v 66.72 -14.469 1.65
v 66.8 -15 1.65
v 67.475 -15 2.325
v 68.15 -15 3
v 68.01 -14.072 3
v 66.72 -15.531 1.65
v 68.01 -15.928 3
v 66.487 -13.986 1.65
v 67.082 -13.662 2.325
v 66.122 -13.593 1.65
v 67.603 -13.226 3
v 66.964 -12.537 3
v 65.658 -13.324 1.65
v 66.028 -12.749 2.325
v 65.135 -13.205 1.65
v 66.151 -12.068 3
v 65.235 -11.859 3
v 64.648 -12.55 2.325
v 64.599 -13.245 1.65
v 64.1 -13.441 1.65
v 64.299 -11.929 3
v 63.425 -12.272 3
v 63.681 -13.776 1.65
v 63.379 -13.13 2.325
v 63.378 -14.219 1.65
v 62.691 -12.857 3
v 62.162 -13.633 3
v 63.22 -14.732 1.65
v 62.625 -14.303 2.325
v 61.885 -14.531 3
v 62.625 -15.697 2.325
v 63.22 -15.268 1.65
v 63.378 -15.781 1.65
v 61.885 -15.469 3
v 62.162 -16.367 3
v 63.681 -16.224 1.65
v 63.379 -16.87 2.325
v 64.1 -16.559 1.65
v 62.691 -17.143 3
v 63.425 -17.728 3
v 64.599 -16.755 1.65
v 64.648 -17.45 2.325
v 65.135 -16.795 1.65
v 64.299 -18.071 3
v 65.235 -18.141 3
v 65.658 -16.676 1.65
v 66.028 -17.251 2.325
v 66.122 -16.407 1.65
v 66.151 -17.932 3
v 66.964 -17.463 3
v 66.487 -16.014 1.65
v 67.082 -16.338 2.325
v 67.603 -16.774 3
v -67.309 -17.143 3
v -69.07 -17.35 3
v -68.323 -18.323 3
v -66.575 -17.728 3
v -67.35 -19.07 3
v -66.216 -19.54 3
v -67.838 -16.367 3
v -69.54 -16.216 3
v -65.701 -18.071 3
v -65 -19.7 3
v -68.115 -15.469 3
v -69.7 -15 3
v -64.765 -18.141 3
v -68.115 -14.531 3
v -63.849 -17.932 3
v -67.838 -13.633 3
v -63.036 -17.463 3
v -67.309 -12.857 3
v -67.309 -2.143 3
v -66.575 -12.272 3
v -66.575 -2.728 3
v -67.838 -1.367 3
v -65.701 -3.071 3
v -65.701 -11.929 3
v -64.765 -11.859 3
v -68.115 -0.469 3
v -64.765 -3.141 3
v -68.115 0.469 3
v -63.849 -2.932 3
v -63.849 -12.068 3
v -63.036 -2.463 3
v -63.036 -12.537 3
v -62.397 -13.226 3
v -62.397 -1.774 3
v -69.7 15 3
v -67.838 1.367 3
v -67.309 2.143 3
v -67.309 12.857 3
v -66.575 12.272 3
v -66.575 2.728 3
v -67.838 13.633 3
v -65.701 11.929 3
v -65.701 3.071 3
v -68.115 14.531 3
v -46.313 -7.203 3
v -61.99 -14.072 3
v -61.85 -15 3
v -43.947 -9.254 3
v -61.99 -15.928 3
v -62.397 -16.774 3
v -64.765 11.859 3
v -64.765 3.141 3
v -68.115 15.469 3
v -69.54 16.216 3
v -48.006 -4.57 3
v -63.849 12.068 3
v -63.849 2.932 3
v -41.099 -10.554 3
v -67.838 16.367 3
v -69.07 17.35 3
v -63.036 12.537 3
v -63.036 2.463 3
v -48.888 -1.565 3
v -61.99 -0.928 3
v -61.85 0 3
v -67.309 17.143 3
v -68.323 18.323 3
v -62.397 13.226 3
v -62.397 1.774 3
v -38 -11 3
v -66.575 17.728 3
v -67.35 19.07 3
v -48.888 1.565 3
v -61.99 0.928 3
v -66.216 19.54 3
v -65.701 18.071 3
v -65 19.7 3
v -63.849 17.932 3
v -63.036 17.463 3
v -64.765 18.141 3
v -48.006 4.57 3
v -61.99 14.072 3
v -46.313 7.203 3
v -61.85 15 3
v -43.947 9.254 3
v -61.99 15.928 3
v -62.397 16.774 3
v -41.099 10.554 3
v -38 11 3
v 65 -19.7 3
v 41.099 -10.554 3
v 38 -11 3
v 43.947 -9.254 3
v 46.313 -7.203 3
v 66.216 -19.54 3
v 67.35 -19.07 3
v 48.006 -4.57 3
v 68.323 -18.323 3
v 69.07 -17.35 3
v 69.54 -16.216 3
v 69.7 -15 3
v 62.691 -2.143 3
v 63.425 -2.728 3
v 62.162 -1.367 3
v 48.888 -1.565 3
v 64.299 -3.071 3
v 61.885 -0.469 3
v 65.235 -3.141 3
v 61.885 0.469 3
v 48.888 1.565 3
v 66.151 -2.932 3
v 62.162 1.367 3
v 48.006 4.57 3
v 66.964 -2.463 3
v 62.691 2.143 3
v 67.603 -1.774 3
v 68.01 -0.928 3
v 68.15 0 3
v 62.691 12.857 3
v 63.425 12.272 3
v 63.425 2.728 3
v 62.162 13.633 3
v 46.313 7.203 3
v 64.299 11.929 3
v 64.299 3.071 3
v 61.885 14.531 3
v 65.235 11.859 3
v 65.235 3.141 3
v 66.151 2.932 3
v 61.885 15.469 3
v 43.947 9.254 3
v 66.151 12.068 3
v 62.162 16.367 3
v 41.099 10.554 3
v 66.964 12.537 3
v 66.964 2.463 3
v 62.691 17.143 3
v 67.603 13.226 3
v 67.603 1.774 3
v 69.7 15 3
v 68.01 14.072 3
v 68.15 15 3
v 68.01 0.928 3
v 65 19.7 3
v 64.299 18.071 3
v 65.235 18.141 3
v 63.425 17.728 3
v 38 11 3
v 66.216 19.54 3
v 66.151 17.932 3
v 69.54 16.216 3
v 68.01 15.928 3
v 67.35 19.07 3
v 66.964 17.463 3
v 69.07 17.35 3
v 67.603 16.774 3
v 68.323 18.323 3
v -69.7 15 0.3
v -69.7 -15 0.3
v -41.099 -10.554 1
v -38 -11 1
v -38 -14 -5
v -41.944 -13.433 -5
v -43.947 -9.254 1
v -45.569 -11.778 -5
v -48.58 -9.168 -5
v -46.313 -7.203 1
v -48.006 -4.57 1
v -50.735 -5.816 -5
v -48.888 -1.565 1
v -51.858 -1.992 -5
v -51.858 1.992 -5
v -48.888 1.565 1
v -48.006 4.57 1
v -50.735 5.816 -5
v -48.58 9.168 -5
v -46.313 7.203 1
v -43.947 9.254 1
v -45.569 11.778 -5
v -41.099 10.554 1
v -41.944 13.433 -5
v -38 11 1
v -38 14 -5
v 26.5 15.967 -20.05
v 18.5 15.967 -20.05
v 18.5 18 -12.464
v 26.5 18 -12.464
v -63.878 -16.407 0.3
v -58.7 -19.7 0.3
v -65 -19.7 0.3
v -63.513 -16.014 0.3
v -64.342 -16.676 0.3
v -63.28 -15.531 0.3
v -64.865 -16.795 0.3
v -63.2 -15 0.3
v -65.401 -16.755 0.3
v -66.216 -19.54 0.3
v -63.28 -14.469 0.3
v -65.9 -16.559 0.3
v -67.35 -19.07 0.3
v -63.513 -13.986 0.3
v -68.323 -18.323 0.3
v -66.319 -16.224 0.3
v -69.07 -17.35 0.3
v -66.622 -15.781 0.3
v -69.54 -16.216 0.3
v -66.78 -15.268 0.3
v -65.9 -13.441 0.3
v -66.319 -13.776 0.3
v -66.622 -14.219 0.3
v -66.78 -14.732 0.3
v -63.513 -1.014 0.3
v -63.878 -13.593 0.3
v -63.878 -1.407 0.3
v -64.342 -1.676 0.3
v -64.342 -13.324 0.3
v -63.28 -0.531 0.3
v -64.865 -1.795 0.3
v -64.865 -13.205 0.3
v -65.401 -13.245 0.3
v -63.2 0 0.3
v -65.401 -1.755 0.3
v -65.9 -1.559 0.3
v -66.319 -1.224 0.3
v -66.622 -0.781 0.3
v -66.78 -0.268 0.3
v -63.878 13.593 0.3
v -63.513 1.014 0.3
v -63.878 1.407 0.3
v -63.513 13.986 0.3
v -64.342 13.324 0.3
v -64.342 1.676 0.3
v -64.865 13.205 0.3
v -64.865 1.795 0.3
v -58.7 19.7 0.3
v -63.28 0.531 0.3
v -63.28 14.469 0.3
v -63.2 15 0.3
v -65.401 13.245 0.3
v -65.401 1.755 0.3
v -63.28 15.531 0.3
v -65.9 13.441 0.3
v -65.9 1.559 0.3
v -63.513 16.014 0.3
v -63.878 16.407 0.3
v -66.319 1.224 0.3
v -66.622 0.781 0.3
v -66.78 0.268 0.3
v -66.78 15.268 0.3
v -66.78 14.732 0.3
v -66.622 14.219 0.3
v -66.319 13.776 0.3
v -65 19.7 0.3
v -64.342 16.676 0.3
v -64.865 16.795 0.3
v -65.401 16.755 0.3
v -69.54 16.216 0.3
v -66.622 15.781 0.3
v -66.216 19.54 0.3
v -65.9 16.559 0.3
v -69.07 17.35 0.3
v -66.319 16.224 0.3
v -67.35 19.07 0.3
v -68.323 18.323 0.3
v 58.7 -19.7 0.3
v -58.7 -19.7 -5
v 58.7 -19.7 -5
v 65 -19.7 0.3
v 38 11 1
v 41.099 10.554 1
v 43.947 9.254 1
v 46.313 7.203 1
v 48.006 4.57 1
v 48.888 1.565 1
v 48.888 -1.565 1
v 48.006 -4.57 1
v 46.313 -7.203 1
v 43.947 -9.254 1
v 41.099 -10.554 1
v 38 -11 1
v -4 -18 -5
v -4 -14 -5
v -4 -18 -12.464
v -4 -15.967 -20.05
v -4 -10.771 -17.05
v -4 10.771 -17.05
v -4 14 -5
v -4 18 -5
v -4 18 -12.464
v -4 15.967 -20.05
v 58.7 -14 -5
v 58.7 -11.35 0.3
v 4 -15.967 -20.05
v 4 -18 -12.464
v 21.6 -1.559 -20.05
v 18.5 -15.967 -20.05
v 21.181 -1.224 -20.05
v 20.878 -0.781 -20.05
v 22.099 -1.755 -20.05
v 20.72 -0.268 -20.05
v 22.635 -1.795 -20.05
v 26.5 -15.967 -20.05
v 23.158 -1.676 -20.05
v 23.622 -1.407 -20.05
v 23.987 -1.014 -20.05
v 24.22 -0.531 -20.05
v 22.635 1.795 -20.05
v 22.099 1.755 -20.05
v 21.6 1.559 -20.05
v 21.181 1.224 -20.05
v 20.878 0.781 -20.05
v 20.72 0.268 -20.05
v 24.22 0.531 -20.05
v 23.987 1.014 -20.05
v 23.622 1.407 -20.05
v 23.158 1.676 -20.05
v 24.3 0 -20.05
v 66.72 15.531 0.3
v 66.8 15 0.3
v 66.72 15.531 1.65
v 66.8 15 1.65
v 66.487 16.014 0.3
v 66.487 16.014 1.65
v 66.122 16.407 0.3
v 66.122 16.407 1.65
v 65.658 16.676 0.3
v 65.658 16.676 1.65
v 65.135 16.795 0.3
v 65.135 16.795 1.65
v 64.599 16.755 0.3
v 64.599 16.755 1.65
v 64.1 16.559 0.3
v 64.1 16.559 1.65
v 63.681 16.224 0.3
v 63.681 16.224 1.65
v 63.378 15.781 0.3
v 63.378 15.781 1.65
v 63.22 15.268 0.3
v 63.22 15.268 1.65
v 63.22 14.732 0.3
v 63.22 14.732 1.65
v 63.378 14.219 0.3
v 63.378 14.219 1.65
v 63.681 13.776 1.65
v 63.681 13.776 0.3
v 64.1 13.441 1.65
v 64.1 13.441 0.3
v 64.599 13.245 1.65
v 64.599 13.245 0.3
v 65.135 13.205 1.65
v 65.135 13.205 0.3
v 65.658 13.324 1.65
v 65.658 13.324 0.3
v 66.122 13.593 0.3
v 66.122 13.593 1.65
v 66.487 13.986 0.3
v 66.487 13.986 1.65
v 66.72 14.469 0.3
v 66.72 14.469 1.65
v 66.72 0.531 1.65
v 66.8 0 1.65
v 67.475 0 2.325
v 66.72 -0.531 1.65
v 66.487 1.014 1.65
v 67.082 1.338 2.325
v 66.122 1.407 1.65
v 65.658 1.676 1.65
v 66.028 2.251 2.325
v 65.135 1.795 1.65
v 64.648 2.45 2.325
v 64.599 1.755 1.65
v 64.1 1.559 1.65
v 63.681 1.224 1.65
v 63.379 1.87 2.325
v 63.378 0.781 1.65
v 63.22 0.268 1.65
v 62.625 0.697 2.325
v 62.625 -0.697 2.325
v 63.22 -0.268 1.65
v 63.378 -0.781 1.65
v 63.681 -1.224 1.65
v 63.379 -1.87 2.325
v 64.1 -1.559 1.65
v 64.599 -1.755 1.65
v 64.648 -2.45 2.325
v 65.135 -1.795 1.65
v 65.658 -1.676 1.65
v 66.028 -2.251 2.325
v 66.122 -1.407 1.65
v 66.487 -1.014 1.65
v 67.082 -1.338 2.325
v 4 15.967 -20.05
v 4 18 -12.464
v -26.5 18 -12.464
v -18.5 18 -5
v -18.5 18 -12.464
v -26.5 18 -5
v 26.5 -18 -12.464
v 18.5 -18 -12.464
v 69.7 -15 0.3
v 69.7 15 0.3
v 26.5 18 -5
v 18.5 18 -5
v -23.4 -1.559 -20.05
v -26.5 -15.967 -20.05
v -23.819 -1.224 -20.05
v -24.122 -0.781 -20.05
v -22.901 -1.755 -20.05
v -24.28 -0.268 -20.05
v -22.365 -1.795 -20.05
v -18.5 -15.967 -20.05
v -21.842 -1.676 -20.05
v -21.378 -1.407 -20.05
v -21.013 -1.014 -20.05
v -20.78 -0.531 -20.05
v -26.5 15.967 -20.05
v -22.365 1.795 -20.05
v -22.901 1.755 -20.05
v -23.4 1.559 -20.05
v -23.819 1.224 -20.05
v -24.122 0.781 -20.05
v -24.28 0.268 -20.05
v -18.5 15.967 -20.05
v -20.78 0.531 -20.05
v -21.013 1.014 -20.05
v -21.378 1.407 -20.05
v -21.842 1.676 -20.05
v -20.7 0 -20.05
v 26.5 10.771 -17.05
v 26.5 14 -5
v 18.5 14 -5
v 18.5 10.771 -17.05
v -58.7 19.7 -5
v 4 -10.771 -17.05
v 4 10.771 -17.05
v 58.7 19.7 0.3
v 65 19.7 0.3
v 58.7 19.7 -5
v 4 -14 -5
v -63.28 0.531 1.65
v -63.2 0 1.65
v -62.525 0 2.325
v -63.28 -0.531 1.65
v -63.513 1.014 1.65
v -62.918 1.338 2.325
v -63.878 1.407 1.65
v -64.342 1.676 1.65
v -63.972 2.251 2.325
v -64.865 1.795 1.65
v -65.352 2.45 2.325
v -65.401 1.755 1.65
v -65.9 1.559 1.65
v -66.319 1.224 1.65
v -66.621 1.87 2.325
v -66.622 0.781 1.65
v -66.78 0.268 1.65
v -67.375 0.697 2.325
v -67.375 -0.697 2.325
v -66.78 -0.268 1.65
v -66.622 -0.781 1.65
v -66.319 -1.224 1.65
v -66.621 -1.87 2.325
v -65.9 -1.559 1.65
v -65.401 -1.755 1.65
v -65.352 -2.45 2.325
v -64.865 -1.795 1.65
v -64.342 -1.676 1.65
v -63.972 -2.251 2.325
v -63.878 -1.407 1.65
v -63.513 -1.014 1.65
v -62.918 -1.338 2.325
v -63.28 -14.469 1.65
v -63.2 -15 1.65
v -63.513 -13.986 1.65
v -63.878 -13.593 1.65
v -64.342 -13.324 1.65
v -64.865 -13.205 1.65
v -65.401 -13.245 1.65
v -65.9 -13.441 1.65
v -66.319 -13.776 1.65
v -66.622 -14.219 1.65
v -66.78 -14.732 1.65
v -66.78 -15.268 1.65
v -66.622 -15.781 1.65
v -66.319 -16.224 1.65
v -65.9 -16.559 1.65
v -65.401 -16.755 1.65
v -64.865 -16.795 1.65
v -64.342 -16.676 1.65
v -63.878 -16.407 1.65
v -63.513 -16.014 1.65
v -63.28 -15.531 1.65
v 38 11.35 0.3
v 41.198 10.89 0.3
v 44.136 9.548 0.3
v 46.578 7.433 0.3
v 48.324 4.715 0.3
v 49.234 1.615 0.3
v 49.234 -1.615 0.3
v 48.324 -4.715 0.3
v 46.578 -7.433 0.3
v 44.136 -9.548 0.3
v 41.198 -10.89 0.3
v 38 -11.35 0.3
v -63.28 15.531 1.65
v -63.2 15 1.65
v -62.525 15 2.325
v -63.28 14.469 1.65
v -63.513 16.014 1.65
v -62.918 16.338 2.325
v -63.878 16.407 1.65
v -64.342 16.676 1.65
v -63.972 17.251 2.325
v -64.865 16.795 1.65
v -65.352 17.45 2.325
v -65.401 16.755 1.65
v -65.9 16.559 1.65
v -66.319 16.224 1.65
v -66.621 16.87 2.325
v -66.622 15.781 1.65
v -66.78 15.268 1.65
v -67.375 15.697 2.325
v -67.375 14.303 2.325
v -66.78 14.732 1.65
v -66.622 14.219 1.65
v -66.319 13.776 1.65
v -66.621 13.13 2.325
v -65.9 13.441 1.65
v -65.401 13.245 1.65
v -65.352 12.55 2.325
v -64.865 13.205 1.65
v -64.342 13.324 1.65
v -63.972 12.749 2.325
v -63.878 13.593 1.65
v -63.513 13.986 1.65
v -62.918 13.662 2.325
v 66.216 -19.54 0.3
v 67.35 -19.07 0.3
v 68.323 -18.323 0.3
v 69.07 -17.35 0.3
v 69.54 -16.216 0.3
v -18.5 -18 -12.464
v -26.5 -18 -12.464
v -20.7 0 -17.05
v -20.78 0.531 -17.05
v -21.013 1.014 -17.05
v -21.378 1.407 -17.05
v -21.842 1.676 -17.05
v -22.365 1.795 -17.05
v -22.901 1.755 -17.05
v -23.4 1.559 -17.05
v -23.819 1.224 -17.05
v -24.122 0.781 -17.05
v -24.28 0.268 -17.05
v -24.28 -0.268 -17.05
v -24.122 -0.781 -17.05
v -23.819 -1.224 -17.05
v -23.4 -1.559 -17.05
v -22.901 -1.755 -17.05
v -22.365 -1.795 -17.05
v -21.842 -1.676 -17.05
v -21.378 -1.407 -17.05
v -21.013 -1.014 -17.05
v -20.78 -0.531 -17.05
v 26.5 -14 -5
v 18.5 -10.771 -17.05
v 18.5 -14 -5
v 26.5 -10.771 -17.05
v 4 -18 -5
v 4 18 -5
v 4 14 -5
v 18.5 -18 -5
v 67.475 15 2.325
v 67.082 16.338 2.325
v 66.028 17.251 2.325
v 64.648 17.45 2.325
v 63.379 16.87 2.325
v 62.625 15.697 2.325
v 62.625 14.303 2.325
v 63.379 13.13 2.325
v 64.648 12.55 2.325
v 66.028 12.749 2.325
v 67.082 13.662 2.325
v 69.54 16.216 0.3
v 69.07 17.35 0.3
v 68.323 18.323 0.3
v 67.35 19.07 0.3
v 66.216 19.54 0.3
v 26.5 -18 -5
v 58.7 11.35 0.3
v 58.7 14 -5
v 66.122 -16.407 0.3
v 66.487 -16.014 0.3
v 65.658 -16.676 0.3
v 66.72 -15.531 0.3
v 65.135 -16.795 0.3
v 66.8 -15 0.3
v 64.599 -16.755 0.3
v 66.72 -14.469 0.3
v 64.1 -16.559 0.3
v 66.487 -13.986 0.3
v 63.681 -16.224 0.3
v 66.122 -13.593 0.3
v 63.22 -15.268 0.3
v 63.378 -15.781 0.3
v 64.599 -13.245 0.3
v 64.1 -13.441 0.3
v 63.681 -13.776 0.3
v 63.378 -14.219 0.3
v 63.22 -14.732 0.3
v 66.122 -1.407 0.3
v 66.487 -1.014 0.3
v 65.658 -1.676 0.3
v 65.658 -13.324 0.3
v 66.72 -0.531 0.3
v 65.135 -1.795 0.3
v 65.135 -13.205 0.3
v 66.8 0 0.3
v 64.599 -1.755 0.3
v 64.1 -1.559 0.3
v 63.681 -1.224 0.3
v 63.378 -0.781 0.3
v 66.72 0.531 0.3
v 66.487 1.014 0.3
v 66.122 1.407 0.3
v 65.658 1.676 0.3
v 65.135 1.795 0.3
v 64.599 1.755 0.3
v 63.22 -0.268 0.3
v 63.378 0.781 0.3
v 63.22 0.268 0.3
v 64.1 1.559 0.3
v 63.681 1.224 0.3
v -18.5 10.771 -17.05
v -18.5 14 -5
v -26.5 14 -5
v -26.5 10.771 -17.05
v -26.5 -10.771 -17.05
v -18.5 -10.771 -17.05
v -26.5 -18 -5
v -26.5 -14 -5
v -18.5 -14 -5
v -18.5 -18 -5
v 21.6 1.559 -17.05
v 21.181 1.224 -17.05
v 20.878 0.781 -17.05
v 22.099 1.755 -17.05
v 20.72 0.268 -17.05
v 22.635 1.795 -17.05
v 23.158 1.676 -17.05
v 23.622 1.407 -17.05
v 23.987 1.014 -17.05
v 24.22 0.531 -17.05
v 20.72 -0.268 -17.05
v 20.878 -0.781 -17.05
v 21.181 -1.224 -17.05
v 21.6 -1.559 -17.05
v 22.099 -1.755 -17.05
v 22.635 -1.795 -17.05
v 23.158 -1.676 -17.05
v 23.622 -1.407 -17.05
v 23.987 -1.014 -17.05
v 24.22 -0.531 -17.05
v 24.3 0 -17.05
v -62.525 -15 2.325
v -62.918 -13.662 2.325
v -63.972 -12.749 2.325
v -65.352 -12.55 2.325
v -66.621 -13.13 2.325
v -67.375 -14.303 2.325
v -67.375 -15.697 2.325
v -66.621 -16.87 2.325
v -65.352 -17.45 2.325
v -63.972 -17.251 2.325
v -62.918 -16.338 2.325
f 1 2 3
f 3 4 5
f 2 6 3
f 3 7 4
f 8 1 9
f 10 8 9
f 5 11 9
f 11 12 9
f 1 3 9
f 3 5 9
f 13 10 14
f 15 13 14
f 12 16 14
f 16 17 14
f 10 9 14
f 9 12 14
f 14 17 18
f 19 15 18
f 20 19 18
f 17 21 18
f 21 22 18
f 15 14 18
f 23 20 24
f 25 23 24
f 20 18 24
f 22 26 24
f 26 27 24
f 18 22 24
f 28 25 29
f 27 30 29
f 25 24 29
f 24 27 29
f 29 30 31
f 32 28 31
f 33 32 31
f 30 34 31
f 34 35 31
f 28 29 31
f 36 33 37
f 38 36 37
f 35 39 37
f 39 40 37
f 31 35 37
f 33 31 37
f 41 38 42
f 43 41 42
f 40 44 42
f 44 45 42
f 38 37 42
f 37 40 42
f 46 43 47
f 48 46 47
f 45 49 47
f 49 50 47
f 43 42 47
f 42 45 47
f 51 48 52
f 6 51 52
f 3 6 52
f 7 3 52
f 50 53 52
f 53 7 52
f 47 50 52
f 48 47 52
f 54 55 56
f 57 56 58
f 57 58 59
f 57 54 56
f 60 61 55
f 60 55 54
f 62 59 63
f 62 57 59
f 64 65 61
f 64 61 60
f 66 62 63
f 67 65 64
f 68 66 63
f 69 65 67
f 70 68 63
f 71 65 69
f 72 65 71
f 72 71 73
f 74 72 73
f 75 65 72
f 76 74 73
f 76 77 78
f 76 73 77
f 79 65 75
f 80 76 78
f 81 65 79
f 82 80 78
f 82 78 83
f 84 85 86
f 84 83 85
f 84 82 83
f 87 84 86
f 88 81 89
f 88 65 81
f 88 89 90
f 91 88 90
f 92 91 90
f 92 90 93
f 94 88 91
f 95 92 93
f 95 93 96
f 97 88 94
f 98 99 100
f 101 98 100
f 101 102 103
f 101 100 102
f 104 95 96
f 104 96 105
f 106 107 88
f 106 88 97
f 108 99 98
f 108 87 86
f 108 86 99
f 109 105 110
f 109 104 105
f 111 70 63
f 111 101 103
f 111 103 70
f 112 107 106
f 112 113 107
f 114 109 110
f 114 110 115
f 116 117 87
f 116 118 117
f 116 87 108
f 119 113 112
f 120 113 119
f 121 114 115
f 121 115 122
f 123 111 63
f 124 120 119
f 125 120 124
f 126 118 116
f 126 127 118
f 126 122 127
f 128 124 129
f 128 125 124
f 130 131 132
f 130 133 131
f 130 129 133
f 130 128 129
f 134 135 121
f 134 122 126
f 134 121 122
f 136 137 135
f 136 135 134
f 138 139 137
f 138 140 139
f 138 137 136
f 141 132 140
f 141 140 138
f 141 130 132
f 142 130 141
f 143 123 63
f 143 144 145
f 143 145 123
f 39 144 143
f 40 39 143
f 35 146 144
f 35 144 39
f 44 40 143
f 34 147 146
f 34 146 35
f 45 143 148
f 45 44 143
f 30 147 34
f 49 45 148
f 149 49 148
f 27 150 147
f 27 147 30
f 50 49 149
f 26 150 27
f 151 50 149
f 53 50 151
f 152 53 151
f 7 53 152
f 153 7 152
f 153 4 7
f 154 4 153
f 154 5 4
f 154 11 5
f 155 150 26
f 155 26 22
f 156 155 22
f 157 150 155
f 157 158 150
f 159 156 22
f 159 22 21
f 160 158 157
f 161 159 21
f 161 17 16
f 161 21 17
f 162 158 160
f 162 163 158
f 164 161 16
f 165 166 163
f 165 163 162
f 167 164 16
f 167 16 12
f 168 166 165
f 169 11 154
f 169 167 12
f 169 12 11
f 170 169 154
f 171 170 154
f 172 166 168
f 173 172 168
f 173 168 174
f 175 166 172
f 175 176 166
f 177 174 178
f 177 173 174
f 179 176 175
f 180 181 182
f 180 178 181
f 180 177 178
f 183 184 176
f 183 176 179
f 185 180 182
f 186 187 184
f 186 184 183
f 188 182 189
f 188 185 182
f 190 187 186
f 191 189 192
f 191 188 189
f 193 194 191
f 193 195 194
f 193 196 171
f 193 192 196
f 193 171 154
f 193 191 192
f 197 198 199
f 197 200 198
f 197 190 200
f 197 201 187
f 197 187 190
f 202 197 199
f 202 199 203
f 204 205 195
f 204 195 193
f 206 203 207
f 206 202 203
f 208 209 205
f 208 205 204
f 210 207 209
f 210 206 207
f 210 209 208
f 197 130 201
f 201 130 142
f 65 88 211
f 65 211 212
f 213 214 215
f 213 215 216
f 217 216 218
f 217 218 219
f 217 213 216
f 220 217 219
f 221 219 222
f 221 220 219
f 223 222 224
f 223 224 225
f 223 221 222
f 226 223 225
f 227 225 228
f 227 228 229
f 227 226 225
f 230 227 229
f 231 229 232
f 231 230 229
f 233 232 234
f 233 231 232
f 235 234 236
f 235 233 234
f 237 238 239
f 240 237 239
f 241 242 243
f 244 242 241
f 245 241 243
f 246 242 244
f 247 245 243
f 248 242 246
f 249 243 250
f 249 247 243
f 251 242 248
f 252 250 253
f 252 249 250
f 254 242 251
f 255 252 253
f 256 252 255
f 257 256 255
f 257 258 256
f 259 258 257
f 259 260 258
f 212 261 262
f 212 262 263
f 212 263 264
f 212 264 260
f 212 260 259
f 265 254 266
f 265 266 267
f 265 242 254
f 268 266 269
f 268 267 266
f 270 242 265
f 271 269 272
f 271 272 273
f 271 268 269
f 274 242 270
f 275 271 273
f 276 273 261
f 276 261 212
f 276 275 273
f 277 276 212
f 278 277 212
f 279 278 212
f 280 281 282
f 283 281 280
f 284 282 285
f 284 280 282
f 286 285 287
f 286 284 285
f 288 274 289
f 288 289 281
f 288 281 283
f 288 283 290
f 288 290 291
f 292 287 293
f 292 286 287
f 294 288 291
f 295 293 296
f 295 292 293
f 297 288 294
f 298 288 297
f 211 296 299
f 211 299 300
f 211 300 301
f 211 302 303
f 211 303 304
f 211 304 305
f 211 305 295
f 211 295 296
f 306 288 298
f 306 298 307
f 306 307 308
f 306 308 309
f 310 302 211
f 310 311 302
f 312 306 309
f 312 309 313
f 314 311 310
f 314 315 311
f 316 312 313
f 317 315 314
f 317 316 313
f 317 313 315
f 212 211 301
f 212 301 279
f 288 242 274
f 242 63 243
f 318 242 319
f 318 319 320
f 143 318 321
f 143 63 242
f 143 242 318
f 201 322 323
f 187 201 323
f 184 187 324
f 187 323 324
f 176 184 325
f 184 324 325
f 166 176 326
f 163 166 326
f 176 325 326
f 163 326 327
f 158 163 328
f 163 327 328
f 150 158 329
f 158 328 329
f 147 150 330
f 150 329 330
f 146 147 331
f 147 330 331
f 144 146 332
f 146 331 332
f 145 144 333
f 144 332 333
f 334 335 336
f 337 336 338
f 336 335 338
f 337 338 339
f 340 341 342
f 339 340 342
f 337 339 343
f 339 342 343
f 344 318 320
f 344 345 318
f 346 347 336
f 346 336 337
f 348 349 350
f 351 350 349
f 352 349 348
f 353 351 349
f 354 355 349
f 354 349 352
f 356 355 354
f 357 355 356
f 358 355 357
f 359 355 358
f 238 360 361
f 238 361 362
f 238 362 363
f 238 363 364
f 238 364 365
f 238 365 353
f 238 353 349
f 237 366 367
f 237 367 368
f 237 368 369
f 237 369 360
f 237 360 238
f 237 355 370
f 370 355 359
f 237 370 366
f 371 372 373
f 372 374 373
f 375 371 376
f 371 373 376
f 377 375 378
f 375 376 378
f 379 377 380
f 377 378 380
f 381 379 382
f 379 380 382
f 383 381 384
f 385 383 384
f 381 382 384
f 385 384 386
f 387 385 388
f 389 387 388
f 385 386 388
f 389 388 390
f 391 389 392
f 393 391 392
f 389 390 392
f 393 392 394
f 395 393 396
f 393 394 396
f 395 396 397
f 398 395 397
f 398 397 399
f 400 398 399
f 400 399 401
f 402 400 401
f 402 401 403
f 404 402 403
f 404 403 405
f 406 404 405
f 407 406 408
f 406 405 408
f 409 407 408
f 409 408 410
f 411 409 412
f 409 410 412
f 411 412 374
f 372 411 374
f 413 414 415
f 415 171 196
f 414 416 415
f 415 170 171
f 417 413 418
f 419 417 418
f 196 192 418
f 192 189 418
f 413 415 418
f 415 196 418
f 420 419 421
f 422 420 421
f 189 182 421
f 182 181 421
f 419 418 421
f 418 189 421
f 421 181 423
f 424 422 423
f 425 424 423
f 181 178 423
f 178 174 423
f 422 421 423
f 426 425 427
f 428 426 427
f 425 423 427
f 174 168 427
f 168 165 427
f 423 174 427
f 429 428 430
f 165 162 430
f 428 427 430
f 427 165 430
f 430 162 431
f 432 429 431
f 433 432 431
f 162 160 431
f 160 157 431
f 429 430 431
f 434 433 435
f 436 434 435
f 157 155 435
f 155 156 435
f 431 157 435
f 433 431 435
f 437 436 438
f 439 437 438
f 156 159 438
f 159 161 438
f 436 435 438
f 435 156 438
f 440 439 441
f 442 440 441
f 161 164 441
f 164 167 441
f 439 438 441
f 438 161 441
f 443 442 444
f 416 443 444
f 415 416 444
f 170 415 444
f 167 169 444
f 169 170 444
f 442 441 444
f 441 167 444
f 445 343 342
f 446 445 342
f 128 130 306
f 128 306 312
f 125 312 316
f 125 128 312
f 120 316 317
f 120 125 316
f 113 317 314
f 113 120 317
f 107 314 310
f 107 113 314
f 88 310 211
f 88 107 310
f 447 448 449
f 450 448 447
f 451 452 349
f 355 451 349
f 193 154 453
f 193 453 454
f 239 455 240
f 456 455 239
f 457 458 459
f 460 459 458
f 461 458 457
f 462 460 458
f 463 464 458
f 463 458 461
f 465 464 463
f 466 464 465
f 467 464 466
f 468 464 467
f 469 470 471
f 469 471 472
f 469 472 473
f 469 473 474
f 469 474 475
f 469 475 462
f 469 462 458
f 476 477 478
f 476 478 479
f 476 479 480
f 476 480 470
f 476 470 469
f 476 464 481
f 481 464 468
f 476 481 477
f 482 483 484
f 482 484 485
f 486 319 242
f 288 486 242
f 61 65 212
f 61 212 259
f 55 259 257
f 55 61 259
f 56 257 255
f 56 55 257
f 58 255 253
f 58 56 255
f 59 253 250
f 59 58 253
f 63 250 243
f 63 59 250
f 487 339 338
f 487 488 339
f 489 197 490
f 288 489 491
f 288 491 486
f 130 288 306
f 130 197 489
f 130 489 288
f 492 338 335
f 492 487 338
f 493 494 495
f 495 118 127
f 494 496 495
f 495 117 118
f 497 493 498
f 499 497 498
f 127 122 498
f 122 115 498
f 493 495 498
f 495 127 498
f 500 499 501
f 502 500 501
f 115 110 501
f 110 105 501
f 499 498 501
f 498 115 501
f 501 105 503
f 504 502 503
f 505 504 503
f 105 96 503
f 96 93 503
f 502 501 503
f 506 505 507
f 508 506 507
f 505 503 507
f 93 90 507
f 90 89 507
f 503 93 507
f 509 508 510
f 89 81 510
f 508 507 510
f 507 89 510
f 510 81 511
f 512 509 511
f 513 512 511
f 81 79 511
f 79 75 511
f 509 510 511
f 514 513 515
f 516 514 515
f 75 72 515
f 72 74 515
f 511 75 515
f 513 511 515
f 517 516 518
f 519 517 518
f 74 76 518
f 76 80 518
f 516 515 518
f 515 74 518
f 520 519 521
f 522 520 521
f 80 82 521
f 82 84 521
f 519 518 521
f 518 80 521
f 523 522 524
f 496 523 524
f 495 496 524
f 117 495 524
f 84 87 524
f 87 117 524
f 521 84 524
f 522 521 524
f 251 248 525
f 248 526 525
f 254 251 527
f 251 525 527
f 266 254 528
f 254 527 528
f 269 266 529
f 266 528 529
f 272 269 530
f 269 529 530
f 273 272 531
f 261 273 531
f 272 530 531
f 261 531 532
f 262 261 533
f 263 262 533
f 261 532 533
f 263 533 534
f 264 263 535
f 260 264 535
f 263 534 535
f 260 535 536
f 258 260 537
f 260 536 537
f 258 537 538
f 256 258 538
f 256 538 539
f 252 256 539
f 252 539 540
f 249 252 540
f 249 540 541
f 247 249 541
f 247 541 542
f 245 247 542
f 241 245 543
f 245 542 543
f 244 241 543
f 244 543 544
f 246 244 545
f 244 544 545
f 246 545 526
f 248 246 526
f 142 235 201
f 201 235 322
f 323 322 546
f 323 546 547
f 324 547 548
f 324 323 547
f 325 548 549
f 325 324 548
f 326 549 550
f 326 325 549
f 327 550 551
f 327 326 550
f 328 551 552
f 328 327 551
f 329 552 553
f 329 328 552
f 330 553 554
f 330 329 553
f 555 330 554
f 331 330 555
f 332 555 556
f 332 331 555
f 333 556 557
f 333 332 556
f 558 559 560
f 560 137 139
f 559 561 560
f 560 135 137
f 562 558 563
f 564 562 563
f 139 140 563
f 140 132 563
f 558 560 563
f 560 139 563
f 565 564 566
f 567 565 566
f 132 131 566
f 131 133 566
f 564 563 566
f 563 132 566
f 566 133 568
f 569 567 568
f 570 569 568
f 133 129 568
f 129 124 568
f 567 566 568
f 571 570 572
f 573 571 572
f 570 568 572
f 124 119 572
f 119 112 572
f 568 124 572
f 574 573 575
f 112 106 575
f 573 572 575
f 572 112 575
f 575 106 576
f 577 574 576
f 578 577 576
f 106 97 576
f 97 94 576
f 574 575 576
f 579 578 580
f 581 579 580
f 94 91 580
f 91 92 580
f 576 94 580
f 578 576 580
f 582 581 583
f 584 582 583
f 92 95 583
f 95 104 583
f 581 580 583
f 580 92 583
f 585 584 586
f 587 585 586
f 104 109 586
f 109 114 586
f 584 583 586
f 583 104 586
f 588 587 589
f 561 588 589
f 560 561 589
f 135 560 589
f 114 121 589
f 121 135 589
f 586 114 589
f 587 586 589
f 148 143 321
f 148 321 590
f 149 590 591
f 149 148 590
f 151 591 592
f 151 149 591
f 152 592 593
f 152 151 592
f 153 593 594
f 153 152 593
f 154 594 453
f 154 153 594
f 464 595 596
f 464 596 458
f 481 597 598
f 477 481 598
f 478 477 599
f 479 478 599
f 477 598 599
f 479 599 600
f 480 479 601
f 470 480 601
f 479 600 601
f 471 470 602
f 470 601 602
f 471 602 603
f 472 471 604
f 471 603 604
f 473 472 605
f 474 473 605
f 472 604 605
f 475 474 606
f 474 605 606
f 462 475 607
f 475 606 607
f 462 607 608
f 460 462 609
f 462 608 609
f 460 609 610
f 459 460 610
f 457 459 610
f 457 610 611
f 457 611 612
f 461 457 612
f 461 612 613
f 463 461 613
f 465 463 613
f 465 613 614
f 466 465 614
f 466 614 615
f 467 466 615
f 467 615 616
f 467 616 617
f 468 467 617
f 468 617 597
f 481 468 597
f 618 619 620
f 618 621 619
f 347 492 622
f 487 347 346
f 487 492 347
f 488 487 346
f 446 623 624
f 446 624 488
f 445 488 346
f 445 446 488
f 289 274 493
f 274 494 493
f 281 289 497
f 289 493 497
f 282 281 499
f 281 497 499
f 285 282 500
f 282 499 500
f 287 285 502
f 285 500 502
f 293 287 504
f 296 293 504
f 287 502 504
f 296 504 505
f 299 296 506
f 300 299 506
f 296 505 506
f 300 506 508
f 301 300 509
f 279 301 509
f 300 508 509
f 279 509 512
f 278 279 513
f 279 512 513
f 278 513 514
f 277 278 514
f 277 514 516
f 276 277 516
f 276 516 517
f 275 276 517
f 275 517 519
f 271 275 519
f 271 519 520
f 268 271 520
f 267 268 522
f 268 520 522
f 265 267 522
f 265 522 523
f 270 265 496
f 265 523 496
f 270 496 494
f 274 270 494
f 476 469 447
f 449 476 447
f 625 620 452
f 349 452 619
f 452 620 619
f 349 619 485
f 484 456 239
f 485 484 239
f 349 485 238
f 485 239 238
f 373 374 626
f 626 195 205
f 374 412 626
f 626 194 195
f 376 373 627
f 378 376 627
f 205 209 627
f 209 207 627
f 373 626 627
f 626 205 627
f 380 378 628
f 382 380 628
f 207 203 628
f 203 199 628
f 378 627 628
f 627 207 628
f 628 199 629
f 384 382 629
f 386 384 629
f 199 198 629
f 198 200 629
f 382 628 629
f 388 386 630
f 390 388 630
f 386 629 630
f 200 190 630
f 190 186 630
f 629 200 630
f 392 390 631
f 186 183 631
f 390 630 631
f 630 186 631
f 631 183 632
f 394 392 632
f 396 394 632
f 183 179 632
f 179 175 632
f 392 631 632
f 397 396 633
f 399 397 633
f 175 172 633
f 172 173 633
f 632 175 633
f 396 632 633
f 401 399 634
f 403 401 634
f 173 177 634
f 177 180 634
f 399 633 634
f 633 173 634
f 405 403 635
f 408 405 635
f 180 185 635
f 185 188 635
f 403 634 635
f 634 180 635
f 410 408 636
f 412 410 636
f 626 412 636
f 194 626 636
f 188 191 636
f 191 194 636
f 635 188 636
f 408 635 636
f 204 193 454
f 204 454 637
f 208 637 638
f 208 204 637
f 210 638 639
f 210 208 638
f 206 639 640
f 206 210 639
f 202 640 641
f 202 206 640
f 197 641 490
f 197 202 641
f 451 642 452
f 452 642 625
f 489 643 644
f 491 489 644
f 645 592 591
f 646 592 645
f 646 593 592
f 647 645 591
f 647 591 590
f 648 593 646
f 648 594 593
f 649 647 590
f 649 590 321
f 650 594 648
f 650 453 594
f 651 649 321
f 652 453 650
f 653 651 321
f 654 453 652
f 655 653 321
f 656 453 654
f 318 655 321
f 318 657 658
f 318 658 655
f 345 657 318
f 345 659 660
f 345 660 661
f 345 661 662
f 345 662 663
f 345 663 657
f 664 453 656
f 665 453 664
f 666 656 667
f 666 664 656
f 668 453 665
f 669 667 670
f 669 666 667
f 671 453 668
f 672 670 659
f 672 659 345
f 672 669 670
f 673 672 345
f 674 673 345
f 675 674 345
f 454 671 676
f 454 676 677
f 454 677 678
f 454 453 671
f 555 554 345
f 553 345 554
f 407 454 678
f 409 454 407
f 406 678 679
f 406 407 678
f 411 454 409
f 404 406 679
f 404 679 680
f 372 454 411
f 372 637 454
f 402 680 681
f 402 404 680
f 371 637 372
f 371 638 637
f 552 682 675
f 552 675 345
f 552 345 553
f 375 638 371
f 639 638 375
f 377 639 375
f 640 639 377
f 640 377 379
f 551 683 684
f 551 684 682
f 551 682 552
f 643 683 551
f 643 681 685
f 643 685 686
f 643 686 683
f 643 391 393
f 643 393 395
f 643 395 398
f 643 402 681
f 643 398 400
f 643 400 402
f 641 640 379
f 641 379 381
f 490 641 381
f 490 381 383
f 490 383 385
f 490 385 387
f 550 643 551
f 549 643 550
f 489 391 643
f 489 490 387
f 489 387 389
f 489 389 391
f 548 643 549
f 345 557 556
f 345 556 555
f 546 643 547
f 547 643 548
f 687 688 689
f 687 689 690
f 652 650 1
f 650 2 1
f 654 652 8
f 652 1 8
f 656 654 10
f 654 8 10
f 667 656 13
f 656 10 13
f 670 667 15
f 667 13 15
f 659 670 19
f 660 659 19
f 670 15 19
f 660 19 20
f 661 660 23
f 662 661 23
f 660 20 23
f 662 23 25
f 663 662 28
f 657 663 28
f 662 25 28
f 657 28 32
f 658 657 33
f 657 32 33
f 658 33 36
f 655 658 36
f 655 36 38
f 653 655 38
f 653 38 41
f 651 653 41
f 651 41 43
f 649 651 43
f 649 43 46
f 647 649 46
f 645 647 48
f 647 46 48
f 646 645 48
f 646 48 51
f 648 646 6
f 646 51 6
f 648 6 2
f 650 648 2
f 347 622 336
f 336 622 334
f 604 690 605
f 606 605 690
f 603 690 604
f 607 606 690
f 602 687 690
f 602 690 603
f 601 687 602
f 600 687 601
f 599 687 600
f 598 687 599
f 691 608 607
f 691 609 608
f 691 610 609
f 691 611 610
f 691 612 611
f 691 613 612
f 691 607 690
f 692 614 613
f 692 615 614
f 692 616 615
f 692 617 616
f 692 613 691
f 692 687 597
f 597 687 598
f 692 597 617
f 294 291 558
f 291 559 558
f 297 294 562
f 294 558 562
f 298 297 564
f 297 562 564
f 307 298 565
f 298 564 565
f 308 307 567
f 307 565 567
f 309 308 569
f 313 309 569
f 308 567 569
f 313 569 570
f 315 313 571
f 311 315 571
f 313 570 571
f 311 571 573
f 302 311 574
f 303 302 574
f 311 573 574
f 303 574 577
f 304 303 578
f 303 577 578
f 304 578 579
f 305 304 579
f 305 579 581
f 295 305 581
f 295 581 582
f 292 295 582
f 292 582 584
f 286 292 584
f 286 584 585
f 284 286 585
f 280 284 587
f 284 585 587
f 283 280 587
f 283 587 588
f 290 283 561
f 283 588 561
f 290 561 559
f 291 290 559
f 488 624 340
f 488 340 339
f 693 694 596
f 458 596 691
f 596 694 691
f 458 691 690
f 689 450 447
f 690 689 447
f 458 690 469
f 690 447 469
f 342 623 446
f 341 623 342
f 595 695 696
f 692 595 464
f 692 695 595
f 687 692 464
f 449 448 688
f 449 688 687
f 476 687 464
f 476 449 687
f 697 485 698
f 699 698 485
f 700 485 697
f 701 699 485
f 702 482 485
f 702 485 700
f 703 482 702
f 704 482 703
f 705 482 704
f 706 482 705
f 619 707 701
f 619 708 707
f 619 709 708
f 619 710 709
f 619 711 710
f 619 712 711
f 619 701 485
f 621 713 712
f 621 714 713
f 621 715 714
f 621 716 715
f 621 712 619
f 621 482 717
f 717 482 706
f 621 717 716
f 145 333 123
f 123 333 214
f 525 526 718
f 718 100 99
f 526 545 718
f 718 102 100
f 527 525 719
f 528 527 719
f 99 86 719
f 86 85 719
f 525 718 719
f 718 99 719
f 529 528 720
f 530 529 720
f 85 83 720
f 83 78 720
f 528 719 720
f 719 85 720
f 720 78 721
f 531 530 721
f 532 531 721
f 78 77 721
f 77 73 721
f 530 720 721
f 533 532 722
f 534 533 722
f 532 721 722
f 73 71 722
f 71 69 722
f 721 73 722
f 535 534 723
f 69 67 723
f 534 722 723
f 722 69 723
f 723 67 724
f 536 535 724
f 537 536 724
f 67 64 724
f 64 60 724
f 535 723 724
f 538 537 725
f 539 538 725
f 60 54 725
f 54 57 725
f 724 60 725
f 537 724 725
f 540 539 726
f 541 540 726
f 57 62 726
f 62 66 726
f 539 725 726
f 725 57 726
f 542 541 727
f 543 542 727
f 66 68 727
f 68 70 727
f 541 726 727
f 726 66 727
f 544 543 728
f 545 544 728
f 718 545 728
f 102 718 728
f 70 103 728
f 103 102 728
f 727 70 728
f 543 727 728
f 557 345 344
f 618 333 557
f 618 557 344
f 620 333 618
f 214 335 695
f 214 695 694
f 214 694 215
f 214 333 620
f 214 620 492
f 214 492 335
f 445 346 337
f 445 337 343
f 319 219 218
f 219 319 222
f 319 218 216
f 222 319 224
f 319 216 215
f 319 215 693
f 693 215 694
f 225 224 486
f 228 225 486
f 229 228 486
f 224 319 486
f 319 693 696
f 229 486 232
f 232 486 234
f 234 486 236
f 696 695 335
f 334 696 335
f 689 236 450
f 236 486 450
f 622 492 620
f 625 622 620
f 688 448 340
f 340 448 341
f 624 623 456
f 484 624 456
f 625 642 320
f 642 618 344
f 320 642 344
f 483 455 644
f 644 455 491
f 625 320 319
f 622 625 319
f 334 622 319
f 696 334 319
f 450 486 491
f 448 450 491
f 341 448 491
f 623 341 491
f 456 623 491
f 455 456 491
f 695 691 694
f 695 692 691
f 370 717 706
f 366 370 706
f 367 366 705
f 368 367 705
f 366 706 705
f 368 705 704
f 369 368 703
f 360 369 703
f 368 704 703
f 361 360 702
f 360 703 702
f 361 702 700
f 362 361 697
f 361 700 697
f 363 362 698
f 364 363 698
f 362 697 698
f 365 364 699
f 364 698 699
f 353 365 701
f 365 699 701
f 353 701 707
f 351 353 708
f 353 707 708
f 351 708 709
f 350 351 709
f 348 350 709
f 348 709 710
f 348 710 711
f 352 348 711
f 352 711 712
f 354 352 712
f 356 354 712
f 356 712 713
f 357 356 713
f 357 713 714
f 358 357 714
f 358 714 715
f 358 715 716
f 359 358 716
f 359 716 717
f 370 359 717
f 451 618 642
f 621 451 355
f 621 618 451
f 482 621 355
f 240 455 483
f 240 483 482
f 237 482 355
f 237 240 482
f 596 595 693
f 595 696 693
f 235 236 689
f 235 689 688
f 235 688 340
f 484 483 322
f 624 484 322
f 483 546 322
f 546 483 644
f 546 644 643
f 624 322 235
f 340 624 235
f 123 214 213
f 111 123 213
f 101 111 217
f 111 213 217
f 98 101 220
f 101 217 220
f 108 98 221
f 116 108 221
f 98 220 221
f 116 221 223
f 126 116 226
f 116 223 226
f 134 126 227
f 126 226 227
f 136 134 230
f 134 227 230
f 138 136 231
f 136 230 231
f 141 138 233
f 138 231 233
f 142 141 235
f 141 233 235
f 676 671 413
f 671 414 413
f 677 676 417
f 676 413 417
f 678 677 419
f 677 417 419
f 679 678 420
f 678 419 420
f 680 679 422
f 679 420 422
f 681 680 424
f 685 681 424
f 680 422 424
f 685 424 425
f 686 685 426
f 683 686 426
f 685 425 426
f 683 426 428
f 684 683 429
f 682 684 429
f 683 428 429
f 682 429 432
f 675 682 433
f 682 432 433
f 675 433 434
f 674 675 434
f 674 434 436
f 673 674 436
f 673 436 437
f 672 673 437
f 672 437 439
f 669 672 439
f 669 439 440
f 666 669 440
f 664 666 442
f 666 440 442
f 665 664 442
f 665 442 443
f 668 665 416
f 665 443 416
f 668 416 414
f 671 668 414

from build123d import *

# Parameters (mm, degrees)
SKETCH1_W                = 118
SKETCH1_H                = 40
SKETCH1_W_2              = 11
BOSS_EXTRUDE1_DEPTH      = 3
BOSS_EXTRUDE2_START      = -5
SKETCH1_3_W              = 118
SKETCH1_3_H              = 40
BOSS_EXTRUDE2_DEPTH      = 5
FILLET1_R                = 5
CHAMFER1_SIZE            = 3
CHAMFER1_SIZE2           = 6
BOSS_EXTRUDE3_DEPTH      = 4
LPATTERN1_COUNT          = 2
LPATTERN1_PITCH          = 22.5
LPATTERN1_COL_COUNT      = 2
LPATTERN1_COL_PITCH      = 22.5
M3_CLEARANCE_HOLE1_D     = 3.6
M3_CLEARANCE_HOLE1_DEPTH = 9
M3_CLEARANCE_HOLE1_TIP   = 1.081549114
SKETCH9_W                = 53
SKETCH9_H                = 2
CUT_EXTRUDE1_DEPTH       = 75.34044996
CUT_EXTRUDE2_DEPTH       = 77.362965502
SKETCH12_W               = 5
SKETCH12_H               = 39.4
CUT_EXTRUDE3_DEPTH       = 0.3
SKETCH13_W               = 5
SKETCH13_H               = 39.4
CUT_EXTRUDE4_DEPTH       = 0.3
CUT_EXTRUDE5_START       = -0.3
CUT_EXTRUDE5_DEPTH       = 0.3
CUT_EXTRUDE6_DEPTH       = 30


# Read off the part's stored shape, not the designer's step: CSK for M3 Flat Head Machine Screw1
with BuildPart() as part:
    # Sketch1 → Boss-Extrude1 (new body)
    # profile 1 of 3: a face of its own
    with BuildSketch(Plane.XY):
        Rectangle(SKETCH1_W, SKETCH1_H)
        with BuildLine():
            ThreePointArc((-38, -11), (-49, 0), (-38, 11))
            Line((-38, 11), (38, 11))
            ThreePointArc((38, 11), (49, 0), (38, -11))
            Line((38, -11), (-38, -11))
        make_face(mode=Mode.SUBTRACT)
    # profile 2 of 3: a face of its own
    with BuildSketch(Plane.XY):
        with Locations((-64.5, 0)):
            Rectangle(SKETCH1_W_2, SKETCH1_H)
    # profile 3 of 3: a face of its own
    with BuildSketch(Plane.XY):
        with Locations((64.5, 0)):
            Rectangle(SKETCH1_W_2, SKETCH1_H)
    extrude(amount=BOSS_EXTRUDE1_DEPTH)

    # Sketch1<3> → Boss-Extrude2 (add)
    with BuildSketch(Plane.XY.offset(BOSS_EXTRUDE2_START)):
        Rectangle(SKETCH1_3_W, SKETCH1_3_H)
        with BuildLine():
            ThreePointArc((-38, -11), (-49, 0), (-38, 11))
            Line((-38, 11), (38, 11))
            ThreePointArc((38, 11), (49, 0), (38, -11))
            Line((38, -11), (-38, -11))
        make_face(mode=Mode.SUBTRACT)
    extrude(amount=BOSS_EXTRUDE2_DEPTH)

    # CSK for M3 Flat Head Machine Screw1 outl → CSK for M3 Flat Head Machine Screw1 (revolve, cut)
    with BuildSketch(Plane(origin=(65, 0, 0), x_dir=(1, 0, 0), z_dir=(0, -1, 0))):
        Polygon((0, 0), (1.8, 0), (1.8, 1.65), (3.15, 3), (0, 3), align=None)
    revolve(axis=Axis((65, 0, 0), (0, 0, 1)), mode=Mode.SUBTRACT)

    # CSK for M3 Flat Head Machine Screw1 2 ou → CSK for M3 Flat Head Machine Screw1 2 (revolve, cut)
    with BuildSketch(Plane(origin=(-65, 0, 0), x_dir=(1, 0, 0), z_dir=(0, -1, 0))):
        Polygon((0, 0), (1.8, 0), (1.8, 1.65), (3.15, 3), (0, 3), align=None)
    revolve(axis=Axis((-65, 0, 0), (0, 0, 1)), mode=Mode.SUBTRACT)

    # CSK for M3 Flat Head Machine Screw1 3 ou → CSK for M3 Flat Head Machine Screw1 3 (revolve, cut)
    with BuildSketch(Plane(origin=(-65, -15, 0), x_dir=(1, 0, 0), z_dir=(0, -1, 0))):
        Polygon((0, 0), (1.8, 0), (1.8, 1.65), (3.15, 3), (0, 3), align=None)
    revolve(axis=Axis((-65, -15, 0), (0, 0, 1)), mode=Mode.SUBTRACT)

    # CSK for M3 Flat Head Machine Screw1 4 ou → CSK for M3 Flat Head Machine Screw1 4 (revolve, cut)
    with BuildSketch(Plane(origin=(65, 15, 0), x_dir=(1, 0, 0), z_dir=(0, -1, 0))):
        Polygon((0, 0), (1.8, 0), (1.8, 1.65), (3.15, 3), (0, 3), align=None)
    revolve(axis=Axis((65, 15, 0), (0, 0, 1)), mode=Mode.SUBTRACT)

    # CSK for M3 Flat Head Machine Screw1 5 ou → CSK for M3 Flat Head Machine Screw1 5 (revolve, cut)
    with BuildSketch(Plane(origin=(65, -15, 0), x_dir=(1, 0, 0), z_dir=(0, -1, 0))):
        Polygon((0, 0), (1.8, 0), (1.8, 1.65), (3.15, 3), (0, 3), align=None)
    revolve(axis=Axis((65, -15, 0), (0, 0, 1)), mode=Mode.SUBTRACT)

    # CSK for M3 Flat Head Machine Screw1 6 ou → CSK for M3 Flat Head Machine Screw1 6 (revolve, cut)
    with BuildSketch(Plane(origin=(-65, 15, 0), x_dir=(1, 0, 0), z_dir=(0, -1, 0))):
        Polygon((0, 0), (1.8, 0), (1.8, 1.65), (3.15, 3), (0, 3), align=None)
    revolve(axis=Axis((-65, 15, 0), (0, 0, 1)), mode=Mode.SUBTRACT)

    # Fillet1
    fillet1_edges = [part.edges().sort_by_distance(p)[0] for p in [
        (-70, -20, 1.5),
        (-70, 20, 1.5),
        (70, 20, 1.5),
        (70, -20, 1.5),
    ]]
    fillet(fillet1_edges, radius=FILLET1_R)

    # Chamfer1
    chamfer1_edges = [part.edges().sort_by_distance(p)[0] for p in [
        (0, 11, -5),
        (49, 0, -5),
        (-49, 0, -5),
        (0, -11, -5),
    ]]
    chamfer1_side = [part.faces().sort_by_distance(p)[0] for p in [
        (0, 18.75404655, -5),
    ]]
    chamfer(chamfer1_edges, length=CHAMFER1_SIZE, length2=CHAMFER1_SIZE2, reference=chamfer1_side[0])

    # Sketch5 → Boss-Extrude3 (add, symmetric)
    with BuildSketch(Plane(origin=(0, 0, 0), x_dir=(0, 0, -1), z_dir=(1, 0, 0))):
        Polygon((5, -14), (5, -20), (20.050000007, -15.967364652), (20.050000007, 15.967364652), (5, 20), (5, 14), (17.050000007, 10.771212229), (17.050000007, -10.771212229), align=None)
    boss_extrude3 = extrude(amount=BOSS_EXTRUDE3_DEPTH, both=True)

    # LPattern1: Boss-Extrude3 ×2
    with Locations(*[(i * LPATTERN1_PITCH, 0, 0) for i in range(1, LPATTERN1_COUNT)]):
        add(boss_extrude3)

    # LPattern1 col: Boss-Extrude3 ×2
    with Locations(*[(-i * LPATTERN1_COL_PITCH, 0, 0) for i in range(1, LPATTERN1_COL_COUNT)]):
        add(boss_extrude3)

    # M3 Clearance Hole1
    with Locations(Plane(origin=(0, 0, -20.050000007), x_dir=(-1, 0, 0), z_dir=(0, 0, -1))):
        with Locations((-22.5, 0), (22.5, 0)):
            Hole(M3_CLEARANCE_HOLE1_D / 2, depth=M3_CLEARANCE_HOLE1_DEPTH)
            with Locations((0, 0, -(M3_CLEARANCE_HOLE1_DEPTH + M3_CLEARANCE_HOLE1_TIP / 2))):  # 118° drill point
                Cone(0, M3_CLEARANCE_HOLE1_D / 2, M3_CLEARANCE_HOLE1_TIP, mode=Mode.SUBTRACT)

    # Sketch9 → Cut-Extrude1 (cut, through all)
    with BuildSketch(Plane(origin=(0, 0, -5), x_dir=(-1, 0, 0), z_dir=(0, 0, -1))):
        with Locations((0, 19)):
            Rectangle(SKETCH9_W, SKETCH9_H)
        with Locations((0, -19)):
            Rectangle(SKETCH9_W, SKETCH9_H)
    extrude(amount=CUT_EXTRUDE1_DEPTH, mode=Mode.SUBTRACT)

    # Sketch10 → Cut-Extrude2 (cut, through all)
    with BuildSketch(Plane.XY.offset(3)):
        with BuildLine():
            Line((70, -15), (70, 15))
            ThreePointArc((70, 15), (68.535533906, 18.535533906), (65, 20))
            Line((65, 20), (-65, 20))
            ThreePointArc((-65, 20), (-68.535533906, 18.535533906), (-70, 15))
            Line((-70, 15), (-70, -15))
            ThreePointArc((-70, -15), (-68.535533906, -18.535533906), (-65, -20))
            Line((-65, -20), (65, -20))
            ThreePointArc((65, -20), (68.535533906, -18.535533906), (70, -15))
        make_face()
        with BuildLine():
            Line((69.7, -15), (69.7, 15))
            ThreePointArc((69.7, 15), (68.323401872, 18.323401872), (65, 19.7))
            Line((65, 19.7), (-65, 19.7))
            ThreePointArc((-65, 19.7), (-68.323401872, 18.323401872), (-69.7, 15))
            Line((-69.7, 15), (-69.7, -15))
            ThreePointArc((-69.7, -15), (-68.323401872, -18.323401872), (-65, -19.7))
            Line((-65, -19.7), (65, -19.7))
            ThreePointArc((65, -19.7), (68.323401872, -18.323401872), (69.7, -15))
        make_face(mode=Mode.SUBTRACT)
    extrude(amount=-CUT_EXTRUDE2_DEPTH, mode=Mode.SUBTRACT)

    # Sketch12 → Cut-Extrude3 (cut)
    with BuildSketch(Plane(origin=(59, 0, 0), x_dir=(0, 0, -1), z_dir=(1, 0, 0))):
        with Locations((2.5, 0)):
            Rectangle(SKETCH12_W, SKETCH12_H)
    extrude(amount=-CUT_EXTRUDE3_DEPTH, mode=Mode.SUBTRACT)

    # Sketch13 → Cut-Extrude4 (cut)
    with BuildSketch(Plane.ZY.offset(59)):
        with Locations((-2.5, 0)):
            Rectangle(SKETCH13_W, SKETCH13_H)
    extrude(amount=-CUT_EXTRUDE4_DEPTH, mode=Mode.SUBTRACT)

    # Sketch14 → Cut-Extrude5 (cut)
    with BuildSketch(Plane(origin=(0, 0, 0), x_dir=(-1, 0, 0), z_dir=(0, 0, -1)).offset(CUT_EXTRUDE5_START)):
        with BuildLine():
            Line((-65, -19.7), (-58.7, -19.7))
            Line((-58.7, -19.7), (-58.7, 19.7))
            Line((-58.7, 19.7), (-65, 19.7))
            ThreePointArc((-65, 19.7), (-68.323401872, 18.323401872), (-69.7, 15))
            Line((-69.7, 15), (-69.7, -15))
            ThreePointArc((-69.7, -15), (-68.323401872, -18.323401872), (-65, -19.7))
        make_face()
        with BuildLine():
            Line((58.7, -19.7), (65, -19.7))
            ThreePointArc((65, -19.7), (68.323401872, -18.323401872), (69.7, -15))
            Line((69.7, -15), (69.7, 15))
            ThreePointArc((69.7, 15), (68.323401872, 18.323401872), (65, 19.7))
            Line((65, 19.7), (58.7, 19.7))
            Line((58.7, 19.7), (58.7, -19.7))
        make_face()
    extrude(amount=CUT_EXTRUDE5_DEPTH, mode=Mode.SUBTRACT)

    # Sketch15 → Cut-Extrude6 (cut)
    with BuildSketch(Plane(origin=(58.7, 0, 0), x_dir=(0, 0, -1), z_dir=(1, 0, 0))):
        Polygon((-0.3, -11.35), (5, -14), (5, 14), (-0.3, 11.35), align=None)
    extrude(amount=-CUT_EXTRUDE6_DEPTH, mode=Mode.SUBTRACT)


solid = part.part
